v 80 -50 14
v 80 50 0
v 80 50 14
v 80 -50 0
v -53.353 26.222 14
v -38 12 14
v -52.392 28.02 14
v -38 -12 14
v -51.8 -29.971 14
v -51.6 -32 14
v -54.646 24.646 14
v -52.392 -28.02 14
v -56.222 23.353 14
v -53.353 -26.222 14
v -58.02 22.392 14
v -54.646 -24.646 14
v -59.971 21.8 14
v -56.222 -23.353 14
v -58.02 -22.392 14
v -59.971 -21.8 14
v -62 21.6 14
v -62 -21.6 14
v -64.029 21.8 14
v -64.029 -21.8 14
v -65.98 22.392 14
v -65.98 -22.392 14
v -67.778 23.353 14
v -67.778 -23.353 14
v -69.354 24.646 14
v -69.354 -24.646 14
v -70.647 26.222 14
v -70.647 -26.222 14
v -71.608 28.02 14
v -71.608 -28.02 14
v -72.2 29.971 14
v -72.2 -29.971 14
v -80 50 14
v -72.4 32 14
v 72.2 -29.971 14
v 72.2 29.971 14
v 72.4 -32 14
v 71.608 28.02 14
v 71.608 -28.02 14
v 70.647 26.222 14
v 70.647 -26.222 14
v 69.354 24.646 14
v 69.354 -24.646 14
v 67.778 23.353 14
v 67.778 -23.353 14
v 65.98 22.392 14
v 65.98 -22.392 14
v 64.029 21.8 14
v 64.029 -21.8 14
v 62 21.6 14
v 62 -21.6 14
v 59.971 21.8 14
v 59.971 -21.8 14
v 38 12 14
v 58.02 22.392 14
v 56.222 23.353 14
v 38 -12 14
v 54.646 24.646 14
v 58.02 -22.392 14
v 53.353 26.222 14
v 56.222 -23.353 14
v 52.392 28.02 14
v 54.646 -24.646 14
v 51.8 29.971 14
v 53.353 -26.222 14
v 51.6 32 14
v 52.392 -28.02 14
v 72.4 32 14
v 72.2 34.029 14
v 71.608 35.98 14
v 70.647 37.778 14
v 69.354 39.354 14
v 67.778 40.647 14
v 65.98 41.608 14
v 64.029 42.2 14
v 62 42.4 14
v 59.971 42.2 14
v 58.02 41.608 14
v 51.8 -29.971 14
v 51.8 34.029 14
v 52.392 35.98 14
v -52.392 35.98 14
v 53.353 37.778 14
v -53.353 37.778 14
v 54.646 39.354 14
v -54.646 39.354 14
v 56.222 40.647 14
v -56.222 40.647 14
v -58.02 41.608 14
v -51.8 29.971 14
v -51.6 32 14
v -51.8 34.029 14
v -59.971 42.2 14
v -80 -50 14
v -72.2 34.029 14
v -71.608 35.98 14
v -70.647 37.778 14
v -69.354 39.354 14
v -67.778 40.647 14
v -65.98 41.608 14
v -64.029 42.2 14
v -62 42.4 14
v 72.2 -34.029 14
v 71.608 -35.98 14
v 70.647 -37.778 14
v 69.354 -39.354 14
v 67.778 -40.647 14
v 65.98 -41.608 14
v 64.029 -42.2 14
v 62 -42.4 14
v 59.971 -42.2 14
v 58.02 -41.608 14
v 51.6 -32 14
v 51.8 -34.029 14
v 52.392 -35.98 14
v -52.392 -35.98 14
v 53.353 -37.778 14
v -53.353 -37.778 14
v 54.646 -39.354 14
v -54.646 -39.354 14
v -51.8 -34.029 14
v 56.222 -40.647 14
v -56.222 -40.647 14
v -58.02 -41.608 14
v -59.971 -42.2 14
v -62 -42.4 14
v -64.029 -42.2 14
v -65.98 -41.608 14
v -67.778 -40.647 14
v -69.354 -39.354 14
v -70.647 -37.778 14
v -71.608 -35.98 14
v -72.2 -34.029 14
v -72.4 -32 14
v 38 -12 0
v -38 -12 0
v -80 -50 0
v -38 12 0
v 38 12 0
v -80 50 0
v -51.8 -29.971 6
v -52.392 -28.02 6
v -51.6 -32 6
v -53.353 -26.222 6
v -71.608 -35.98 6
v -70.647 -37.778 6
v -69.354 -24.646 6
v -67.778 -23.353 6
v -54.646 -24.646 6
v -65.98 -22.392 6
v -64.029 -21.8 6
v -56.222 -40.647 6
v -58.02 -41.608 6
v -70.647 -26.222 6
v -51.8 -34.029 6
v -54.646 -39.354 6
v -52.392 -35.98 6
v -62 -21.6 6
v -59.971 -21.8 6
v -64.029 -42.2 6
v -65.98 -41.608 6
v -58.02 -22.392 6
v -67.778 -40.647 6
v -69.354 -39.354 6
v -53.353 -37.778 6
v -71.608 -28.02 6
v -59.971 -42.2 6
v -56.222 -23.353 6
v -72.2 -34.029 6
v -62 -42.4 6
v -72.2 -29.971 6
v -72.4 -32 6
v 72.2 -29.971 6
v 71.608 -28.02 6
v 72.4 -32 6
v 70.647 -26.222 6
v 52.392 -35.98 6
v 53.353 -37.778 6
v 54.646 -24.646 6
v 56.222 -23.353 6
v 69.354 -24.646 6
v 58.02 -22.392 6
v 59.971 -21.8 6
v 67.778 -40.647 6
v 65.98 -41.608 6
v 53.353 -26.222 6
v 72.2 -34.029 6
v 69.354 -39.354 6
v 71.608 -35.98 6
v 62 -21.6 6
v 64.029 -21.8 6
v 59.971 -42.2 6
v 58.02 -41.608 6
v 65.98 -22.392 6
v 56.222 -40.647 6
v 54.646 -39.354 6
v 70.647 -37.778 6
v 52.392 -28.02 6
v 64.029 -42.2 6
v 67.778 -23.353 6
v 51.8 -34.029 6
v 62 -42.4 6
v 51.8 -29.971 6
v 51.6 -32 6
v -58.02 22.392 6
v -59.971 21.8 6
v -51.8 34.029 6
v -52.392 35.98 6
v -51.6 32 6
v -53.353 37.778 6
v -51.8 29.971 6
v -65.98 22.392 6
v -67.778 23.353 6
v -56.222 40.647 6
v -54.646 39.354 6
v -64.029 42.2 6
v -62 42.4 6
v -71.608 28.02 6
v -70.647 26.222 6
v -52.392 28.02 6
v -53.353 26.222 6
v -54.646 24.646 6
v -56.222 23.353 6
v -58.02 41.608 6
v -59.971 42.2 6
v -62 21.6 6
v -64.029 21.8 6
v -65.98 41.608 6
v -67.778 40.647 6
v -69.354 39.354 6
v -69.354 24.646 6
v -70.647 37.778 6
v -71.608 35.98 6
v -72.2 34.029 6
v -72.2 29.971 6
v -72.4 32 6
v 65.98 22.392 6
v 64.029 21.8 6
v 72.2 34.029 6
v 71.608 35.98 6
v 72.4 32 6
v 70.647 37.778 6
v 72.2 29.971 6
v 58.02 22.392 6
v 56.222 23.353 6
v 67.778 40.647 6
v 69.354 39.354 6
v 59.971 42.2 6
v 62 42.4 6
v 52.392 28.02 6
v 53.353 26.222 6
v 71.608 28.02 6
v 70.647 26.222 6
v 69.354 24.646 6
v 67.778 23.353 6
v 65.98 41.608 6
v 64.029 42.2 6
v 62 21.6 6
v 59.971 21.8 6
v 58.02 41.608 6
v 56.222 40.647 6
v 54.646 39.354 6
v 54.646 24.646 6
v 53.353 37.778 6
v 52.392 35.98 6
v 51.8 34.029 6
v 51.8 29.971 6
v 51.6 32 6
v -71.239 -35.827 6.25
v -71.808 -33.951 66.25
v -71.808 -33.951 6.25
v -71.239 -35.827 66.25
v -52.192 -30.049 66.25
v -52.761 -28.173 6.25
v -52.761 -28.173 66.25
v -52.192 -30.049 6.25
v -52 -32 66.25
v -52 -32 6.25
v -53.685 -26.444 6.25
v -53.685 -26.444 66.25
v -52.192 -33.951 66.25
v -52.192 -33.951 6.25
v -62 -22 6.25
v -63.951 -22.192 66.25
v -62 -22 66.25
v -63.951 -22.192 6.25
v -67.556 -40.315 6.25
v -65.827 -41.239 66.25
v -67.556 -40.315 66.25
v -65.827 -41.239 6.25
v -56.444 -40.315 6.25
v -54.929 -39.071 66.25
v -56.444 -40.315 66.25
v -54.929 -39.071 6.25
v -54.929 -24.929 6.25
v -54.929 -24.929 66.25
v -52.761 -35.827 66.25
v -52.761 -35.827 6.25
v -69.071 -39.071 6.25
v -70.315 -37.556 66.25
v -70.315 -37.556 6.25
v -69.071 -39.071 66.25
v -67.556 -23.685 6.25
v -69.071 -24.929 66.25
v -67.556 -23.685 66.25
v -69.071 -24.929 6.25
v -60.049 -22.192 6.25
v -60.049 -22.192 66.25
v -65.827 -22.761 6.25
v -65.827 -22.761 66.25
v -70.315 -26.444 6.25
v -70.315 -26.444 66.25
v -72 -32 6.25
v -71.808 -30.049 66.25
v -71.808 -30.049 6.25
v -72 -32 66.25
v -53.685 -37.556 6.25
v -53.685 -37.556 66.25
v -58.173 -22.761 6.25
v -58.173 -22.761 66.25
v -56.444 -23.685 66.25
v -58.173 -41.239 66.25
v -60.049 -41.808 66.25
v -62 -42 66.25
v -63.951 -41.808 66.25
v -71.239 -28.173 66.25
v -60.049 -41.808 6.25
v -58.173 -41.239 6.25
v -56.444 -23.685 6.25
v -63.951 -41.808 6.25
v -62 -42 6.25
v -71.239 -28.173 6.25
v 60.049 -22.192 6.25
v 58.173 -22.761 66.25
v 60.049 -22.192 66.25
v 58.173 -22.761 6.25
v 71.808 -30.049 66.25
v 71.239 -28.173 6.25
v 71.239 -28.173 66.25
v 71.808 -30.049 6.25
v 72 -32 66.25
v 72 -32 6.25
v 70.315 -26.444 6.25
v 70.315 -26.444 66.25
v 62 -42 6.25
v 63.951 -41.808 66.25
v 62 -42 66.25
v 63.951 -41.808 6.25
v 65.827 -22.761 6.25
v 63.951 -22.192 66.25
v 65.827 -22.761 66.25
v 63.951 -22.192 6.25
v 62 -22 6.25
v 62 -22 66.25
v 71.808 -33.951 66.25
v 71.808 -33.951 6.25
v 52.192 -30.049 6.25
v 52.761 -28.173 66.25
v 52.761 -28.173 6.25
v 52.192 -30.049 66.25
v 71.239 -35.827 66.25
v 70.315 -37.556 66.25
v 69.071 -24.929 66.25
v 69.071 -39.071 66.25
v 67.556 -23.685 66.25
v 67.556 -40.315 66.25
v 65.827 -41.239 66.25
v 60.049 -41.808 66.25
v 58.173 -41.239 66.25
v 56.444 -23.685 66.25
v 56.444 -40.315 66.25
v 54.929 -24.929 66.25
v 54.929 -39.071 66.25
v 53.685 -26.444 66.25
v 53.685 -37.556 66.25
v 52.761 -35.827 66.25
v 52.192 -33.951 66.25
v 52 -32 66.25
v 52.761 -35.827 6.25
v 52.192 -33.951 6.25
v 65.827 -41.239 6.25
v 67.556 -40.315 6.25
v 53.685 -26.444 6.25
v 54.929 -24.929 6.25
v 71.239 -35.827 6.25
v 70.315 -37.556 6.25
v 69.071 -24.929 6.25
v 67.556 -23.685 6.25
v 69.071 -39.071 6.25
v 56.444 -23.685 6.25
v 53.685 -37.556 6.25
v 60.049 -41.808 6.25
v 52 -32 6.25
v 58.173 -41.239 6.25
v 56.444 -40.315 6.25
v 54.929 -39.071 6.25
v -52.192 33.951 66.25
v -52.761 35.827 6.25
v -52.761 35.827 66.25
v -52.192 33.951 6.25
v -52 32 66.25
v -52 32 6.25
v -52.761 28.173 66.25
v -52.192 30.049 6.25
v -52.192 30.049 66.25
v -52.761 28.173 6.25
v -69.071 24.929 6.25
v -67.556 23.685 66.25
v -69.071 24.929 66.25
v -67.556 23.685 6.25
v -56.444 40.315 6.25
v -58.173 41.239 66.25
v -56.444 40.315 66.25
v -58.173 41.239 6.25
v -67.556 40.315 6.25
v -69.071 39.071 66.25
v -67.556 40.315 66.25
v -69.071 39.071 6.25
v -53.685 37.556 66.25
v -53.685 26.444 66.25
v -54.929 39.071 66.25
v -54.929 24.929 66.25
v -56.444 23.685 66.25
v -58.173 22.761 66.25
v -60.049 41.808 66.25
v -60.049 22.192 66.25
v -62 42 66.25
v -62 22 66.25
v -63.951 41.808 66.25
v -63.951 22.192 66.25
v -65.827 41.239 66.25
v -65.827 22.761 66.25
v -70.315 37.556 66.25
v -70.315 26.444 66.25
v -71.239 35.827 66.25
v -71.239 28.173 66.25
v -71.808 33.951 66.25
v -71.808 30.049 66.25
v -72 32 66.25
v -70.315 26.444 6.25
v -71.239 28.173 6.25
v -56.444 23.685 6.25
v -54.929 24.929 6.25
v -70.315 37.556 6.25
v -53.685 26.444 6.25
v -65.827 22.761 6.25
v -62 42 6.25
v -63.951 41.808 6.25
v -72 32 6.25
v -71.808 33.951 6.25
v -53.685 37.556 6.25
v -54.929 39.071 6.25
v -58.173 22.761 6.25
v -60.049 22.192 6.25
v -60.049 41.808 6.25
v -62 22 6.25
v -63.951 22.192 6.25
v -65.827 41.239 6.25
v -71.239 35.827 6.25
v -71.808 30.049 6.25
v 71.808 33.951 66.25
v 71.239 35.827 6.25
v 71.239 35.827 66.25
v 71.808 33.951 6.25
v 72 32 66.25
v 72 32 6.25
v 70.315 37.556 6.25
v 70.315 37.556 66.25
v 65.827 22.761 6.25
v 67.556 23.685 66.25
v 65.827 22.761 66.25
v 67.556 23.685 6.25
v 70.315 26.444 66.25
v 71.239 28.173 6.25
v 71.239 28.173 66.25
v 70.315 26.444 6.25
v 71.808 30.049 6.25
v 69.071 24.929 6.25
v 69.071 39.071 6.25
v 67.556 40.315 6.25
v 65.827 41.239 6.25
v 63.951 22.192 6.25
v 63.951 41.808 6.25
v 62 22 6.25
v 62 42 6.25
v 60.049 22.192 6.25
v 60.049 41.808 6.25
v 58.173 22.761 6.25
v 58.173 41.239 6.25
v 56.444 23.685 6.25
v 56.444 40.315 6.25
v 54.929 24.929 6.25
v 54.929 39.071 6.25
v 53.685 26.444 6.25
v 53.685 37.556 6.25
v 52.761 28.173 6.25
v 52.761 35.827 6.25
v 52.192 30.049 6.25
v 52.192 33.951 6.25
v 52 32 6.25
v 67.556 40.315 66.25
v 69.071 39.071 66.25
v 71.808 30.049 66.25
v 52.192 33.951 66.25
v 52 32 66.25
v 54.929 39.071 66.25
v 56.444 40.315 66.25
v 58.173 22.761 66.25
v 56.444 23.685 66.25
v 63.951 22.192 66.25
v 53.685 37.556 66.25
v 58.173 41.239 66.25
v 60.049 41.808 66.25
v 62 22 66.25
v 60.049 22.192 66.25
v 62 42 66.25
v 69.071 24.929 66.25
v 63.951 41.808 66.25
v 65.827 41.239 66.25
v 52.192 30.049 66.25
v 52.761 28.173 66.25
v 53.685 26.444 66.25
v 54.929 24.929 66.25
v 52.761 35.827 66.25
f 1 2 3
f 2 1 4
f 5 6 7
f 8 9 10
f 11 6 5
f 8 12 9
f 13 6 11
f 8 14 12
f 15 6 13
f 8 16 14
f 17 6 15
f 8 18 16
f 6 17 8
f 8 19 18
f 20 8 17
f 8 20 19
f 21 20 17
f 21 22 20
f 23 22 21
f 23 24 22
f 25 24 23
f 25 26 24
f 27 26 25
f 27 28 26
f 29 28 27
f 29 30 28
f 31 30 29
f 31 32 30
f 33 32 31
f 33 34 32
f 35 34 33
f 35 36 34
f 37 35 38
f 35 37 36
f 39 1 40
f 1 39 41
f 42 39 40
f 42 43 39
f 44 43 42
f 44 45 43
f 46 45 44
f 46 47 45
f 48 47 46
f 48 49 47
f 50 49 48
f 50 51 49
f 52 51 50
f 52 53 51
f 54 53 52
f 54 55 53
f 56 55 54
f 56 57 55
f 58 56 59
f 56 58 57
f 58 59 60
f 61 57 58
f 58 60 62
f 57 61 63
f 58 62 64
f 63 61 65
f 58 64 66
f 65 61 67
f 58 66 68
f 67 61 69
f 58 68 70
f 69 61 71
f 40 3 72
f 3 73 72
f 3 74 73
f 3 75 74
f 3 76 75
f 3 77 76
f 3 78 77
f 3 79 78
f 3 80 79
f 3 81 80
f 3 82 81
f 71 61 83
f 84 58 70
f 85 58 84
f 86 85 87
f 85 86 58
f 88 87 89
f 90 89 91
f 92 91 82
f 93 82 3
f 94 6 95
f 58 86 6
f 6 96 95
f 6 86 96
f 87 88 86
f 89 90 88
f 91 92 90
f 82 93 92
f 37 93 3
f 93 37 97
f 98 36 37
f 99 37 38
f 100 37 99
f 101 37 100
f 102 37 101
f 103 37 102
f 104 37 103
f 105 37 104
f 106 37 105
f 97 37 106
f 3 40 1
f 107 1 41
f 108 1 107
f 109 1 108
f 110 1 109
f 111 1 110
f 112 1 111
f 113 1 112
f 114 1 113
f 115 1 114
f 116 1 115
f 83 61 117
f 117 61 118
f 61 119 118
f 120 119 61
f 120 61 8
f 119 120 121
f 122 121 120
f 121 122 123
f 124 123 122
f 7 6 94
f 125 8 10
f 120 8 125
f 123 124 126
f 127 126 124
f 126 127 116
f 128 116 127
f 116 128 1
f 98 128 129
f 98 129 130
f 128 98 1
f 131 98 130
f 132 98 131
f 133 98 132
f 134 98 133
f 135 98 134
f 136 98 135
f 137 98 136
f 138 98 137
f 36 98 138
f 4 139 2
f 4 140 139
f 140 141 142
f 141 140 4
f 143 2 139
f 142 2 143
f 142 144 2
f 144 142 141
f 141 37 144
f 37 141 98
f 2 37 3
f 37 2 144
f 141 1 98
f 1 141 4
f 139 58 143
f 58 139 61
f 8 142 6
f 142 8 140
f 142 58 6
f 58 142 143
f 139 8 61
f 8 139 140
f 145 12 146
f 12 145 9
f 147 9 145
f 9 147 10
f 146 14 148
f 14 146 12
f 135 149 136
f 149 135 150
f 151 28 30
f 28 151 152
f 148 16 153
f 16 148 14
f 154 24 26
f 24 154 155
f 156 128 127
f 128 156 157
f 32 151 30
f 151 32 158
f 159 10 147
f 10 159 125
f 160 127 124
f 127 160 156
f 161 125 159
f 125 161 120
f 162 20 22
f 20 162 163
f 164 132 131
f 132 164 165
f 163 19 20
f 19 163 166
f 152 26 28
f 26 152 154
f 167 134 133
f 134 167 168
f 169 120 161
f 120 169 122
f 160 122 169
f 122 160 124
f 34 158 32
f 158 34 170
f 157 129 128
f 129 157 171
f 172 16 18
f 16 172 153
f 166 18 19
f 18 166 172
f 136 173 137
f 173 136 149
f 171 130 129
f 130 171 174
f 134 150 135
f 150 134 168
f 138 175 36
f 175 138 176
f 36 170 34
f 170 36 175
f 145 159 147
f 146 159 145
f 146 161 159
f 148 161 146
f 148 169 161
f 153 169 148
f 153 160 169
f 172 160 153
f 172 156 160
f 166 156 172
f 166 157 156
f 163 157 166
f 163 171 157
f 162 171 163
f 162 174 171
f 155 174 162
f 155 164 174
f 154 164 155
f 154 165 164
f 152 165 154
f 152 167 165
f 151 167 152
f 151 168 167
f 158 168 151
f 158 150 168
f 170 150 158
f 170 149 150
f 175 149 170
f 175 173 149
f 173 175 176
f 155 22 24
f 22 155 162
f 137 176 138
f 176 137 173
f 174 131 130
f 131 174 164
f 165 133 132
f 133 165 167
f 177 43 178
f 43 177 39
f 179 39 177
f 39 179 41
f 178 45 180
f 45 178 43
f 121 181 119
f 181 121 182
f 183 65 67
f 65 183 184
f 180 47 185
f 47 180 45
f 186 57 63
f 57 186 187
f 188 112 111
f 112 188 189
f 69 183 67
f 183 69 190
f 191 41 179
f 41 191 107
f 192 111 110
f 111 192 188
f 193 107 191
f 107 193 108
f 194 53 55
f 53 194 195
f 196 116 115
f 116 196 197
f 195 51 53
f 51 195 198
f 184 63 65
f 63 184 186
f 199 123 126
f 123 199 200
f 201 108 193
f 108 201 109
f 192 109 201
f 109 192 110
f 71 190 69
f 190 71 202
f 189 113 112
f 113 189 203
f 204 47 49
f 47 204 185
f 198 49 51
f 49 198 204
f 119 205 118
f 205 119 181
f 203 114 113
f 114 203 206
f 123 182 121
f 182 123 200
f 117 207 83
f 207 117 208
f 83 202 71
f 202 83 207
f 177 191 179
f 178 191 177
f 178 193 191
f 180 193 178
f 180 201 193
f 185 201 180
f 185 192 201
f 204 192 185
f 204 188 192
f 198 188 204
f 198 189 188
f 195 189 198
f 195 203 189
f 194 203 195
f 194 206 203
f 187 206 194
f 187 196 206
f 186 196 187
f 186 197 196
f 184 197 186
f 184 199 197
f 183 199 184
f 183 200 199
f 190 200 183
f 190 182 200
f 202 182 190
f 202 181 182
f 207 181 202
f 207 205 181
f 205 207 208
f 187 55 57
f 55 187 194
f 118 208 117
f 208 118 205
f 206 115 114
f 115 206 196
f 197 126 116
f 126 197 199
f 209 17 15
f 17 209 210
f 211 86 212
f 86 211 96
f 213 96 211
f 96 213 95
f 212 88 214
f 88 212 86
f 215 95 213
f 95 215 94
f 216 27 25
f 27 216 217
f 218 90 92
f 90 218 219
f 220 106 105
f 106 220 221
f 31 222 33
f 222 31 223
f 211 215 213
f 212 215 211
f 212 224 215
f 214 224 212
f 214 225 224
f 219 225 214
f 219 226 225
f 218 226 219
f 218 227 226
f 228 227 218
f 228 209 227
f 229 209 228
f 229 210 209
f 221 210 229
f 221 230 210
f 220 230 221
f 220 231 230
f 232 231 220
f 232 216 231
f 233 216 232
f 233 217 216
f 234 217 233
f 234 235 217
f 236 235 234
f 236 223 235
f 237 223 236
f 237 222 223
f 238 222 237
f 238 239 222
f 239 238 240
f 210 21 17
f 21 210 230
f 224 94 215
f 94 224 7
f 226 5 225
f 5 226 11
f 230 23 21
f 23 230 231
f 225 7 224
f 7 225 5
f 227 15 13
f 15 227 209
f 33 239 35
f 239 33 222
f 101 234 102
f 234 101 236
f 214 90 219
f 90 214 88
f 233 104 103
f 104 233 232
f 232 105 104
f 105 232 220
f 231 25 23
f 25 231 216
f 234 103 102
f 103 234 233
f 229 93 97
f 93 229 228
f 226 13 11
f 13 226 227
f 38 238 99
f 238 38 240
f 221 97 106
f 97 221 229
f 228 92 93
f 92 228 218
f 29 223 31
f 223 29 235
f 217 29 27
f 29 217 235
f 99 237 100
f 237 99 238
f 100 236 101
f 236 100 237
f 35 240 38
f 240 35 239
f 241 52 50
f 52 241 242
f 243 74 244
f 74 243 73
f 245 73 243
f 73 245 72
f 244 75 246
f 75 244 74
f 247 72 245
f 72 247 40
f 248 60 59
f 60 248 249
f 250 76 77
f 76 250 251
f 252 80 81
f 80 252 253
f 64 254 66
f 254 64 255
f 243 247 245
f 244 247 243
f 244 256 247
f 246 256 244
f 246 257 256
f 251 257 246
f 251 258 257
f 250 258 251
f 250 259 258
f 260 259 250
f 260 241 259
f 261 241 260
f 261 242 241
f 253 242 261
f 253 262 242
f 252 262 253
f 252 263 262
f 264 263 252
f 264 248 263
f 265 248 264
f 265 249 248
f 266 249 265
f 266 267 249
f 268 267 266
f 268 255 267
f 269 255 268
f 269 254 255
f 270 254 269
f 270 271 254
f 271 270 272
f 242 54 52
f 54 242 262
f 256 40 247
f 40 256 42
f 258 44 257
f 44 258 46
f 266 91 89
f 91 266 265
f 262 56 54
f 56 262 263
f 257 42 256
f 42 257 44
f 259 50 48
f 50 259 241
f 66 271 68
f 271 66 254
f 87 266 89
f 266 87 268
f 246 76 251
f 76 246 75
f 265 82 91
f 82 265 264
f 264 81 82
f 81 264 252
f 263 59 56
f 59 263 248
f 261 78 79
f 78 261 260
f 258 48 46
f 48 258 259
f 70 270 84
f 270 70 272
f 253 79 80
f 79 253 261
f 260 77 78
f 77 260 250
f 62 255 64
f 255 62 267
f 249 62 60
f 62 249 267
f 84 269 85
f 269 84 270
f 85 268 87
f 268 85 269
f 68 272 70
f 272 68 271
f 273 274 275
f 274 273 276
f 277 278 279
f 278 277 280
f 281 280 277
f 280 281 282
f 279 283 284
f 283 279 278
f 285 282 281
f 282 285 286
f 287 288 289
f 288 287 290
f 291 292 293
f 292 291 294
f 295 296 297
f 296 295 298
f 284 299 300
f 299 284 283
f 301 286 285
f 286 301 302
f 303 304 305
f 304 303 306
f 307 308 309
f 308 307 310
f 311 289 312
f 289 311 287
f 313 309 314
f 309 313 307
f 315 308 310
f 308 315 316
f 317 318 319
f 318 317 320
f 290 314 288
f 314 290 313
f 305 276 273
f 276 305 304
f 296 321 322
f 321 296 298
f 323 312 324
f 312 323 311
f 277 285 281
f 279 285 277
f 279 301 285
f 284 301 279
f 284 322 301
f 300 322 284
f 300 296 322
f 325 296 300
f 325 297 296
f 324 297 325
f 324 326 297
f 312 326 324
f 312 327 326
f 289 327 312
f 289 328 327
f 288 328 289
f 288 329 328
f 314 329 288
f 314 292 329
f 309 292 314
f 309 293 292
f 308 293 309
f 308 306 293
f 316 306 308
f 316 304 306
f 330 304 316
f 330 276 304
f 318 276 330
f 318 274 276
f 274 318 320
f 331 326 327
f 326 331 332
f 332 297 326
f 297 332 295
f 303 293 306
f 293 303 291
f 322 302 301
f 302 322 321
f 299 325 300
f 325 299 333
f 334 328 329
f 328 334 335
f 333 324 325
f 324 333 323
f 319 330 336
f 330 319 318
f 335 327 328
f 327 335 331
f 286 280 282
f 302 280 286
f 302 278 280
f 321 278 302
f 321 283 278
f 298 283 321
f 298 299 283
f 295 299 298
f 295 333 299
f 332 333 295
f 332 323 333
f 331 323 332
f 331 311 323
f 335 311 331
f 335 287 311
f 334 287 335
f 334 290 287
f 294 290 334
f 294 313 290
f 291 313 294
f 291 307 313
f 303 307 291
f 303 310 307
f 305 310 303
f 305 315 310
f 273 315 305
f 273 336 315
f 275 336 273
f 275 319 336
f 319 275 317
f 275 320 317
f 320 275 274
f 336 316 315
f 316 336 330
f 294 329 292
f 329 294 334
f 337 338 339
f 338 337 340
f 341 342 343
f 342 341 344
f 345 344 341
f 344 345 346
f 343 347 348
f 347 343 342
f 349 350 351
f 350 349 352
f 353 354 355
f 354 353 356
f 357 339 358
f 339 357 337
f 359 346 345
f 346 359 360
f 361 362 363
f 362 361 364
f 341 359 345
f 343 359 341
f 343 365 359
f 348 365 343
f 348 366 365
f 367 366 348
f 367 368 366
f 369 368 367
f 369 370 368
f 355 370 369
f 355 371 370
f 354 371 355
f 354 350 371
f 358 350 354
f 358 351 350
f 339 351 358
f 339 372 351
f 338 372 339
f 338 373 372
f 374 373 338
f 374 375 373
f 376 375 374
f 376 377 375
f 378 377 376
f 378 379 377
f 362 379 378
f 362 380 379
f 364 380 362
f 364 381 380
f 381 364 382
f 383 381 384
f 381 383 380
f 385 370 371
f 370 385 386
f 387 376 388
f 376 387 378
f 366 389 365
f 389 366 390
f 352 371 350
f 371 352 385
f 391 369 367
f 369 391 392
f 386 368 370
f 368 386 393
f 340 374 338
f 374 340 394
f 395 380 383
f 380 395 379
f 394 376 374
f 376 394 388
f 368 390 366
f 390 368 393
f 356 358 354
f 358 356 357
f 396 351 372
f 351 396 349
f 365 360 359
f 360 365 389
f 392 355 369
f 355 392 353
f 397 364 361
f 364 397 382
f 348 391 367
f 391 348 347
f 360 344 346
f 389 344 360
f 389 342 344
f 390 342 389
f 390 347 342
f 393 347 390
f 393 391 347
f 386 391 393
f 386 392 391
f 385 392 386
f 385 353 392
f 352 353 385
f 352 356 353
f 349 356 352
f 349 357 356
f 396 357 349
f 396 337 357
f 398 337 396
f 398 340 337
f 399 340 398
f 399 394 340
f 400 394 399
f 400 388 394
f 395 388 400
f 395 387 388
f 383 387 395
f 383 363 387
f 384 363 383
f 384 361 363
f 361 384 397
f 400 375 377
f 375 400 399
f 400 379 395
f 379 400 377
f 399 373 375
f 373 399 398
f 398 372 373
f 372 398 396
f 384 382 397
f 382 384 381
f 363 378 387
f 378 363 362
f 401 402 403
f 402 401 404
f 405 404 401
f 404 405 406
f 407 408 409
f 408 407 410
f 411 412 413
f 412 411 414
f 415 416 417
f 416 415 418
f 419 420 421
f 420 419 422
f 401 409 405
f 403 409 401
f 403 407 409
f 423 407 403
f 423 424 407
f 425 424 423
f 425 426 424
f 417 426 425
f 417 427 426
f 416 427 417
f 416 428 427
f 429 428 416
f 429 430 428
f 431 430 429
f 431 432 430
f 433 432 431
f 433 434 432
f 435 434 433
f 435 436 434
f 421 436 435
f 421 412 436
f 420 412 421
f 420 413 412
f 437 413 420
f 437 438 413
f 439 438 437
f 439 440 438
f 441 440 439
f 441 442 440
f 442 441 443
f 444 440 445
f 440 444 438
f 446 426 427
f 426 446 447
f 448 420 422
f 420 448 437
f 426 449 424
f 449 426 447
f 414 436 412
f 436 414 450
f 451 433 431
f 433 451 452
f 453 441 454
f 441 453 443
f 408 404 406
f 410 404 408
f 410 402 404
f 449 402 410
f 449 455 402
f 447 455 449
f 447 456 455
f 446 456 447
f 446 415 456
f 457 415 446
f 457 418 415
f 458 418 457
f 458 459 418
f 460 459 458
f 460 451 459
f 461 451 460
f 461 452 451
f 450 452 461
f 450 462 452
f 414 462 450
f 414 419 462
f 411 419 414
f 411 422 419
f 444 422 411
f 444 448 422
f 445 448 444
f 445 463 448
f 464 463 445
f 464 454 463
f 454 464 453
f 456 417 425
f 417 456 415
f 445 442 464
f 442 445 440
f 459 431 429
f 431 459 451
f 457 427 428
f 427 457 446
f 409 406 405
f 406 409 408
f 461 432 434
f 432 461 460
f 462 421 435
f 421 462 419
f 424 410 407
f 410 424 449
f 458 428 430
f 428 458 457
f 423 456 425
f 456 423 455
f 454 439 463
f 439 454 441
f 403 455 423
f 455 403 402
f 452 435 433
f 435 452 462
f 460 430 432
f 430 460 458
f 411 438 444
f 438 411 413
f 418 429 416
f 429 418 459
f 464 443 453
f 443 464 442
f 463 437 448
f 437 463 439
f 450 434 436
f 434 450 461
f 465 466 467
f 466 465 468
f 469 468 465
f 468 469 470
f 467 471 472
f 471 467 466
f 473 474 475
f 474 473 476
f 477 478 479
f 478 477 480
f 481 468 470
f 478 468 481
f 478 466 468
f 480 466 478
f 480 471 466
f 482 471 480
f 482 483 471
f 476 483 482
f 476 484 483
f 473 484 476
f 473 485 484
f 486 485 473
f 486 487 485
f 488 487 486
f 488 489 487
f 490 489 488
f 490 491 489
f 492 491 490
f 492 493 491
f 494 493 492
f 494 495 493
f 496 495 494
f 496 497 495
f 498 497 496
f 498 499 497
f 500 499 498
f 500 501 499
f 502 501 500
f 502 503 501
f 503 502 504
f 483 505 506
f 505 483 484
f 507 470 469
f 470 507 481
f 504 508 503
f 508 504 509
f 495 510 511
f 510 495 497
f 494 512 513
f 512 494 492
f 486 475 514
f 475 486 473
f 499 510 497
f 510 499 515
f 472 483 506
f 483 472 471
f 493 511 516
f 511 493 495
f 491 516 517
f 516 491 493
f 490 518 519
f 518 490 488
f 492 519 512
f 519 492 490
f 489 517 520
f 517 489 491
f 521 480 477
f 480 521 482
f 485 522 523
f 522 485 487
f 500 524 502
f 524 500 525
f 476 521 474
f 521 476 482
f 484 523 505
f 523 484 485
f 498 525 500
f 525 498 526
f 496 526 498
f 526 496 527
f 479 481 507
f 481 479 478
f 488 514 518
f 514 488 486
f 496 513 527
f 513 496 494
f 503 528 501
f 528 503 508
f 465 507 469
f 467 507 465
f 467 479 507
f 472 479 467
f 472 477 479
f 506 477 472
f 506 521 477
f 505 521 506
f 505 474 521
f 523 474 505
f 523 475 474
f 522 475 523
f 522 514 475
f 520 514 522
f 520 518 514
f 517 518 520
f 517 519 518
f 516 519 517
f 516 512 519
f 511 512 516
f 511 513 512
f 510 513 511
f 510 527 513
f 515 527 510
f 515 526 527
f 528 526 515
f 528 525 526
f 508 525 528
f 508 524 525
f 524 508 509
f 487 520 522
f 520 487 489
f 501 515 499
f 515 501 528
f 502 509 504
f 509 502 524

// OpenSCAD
$fn = 32;

// ------------------------------------------------------------------------
// Frame with four posts: 160 x 100 mm frame, four d20 posts
// Every part is its own module, assembly() places them once.
// ------------------------------------------------------------------------

// --- part 1 ---
module base_frame() {
  difference() {
    translate([-80, -50, 0]) cube([160, 100, 14]);
    translate([-38, -12, -1]) cube([76, 24, 16]);
    translate([-62, -32, 6]) cylinder(h = 9, d = 20.8);
    translate([62, -32, 6]) cylinder(h = 9, d = 20.8);
    translate([-62, 32, 6]) cylinder(h = 9, d = 20.8);
    translate([62, 32, 6]) cylinder(h = 9, d = 20.8);
  }
}

// --- part 2 ---
module post1() {
  cylinder(h = 60, d = 20);
}

// --- part 3 ---
module post2() {
  cylinder(h = 60, d = 20);
}

// --- part 4 ---
module post3() {
  cylinder(h = 60, d = 20);
}

// --- part 5 ---
module post4() {
  cylinder(h = 60, d = 20);
}

// --- assembly ---
module assembly() {
  translate([0, 0, 0]) rotate([0, 0, 0]) base_frame();
  translate([-62, -32, 6.25]) rotate([0, 0, 0]) post1();
  translate([62, -32, 6.25]) rotate([0, 0, 0]) post2();
  translate([-62, 32, 6.25]) rotate([0, 0, 0]) post3();
  translate([62, 32, 6.25]) rotate([0, 0, 0]) post4();
}

assembly();
